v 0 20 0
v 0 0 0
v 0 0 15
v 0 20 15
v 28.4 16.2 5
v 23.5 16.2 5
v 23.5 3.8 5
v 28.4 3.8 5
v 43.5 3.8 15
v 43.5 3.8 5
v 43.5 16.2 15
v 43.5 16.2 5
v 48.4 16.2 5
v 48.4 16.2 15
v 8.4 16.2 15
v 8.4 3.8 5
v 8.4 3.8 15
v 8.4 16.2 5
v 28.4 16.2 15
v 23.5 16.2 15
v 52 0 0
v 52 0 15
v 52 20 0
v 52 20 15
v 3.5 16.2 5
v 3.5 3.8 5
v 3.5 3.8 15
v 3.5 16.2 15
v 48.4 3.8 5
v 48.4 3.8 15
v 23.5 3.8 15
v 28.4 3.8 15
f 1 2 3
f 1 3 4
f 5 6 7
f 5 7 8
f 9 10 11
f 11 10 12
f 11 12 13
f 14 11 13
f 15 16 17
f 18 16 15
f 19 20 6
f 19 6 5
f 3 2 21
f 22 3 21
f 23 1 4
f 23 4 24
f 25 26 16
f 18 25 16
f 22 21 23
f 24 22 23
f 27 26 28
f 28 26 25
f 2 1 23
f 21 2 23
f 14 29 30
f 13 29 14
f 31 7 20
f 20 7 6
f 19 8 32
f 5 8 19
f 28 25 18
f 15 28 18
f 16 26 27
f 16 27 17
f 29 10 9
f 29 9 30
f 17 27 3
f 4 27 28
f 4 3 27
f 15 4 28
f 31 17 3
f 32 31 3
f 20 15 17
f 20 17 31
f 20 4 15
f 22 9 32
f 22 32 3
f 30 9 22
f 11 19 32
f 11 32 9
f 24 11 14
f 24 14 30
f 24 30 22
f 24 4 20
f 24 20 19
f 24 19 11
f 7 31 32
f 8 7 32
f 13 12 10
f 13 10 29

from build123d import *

# Parameters (mm, degrees)
BOX003_W     = 4.9
BOX003_H     = 12.4
BOX003_DEPTH = 10
BOX002_W     = 4.9
BOX002_H     = 12.4
BOX002_DEPTH = 10
BOX001_W     = 4.9
BOX001_H     = 12.4
BOX001_DEPTH = 10
BOX_W        = 52
BOX_H        = 20
BOX_DEPTH    = 15


with BuildPart() as cubo003:
    # Box003 → Box003 (new body)
    with BuildSketch(Plane(origin=(43.5, 3.8, 5), x_dir=(1, 0, 0), z_dir=(0, 0, 1))):
        with Locations((2.45, 6.2)):
            Rectangle(BOX003_W, BOX003_H)
    extrude(amount=BOX003_DEPTH)


with BuildPart() as cubo002:
    # Box002 → Box002 (new body)
    with BuildSketch(Plane(origin=(23.5, 3.8, 5), x_dir=(1, 0, 0), z_dir=(0, 0, 1))):
        with Locations((2.45, 6.2)):
            Rectangle(BOX002_W, BOX002_H)
    extrude(amount=BOX002_DEPTH)


with BuildPart() as cubo001:
    # Box001 → Box001 (new body)
    with BuildSketch(Plane(origin=(3.5, 3.8, 5), x_dir=(1, 0, 0), z_dir=(0, 0, 1))):
        with Locations((2.45, 6.2)):
            Rectangle(BOX001_W, BOX001_H)
    extrude(amount=BOX001_DEPTH)


with BuildPart() as cut002:
    # Box → Box (new body)
    with BuildSketch(Plane.XY):
        with Locations((26, 10)):
            Rectangle(BOX_W, BOX_H)
    extrude(amount=BOX_DEPTH)

    # Cut: cut Cubo001
    add(cubo001.part, mode=Mode.SUBTRACT)

    # Cut001: cut Cubo002
    add(cubo002.part, mode=Mode.SUBTRACT)

    # Cut002: cut Cubo003
    add(cubo003.part, mode=Mode.SUBTRACT)


solid = cut002.part
